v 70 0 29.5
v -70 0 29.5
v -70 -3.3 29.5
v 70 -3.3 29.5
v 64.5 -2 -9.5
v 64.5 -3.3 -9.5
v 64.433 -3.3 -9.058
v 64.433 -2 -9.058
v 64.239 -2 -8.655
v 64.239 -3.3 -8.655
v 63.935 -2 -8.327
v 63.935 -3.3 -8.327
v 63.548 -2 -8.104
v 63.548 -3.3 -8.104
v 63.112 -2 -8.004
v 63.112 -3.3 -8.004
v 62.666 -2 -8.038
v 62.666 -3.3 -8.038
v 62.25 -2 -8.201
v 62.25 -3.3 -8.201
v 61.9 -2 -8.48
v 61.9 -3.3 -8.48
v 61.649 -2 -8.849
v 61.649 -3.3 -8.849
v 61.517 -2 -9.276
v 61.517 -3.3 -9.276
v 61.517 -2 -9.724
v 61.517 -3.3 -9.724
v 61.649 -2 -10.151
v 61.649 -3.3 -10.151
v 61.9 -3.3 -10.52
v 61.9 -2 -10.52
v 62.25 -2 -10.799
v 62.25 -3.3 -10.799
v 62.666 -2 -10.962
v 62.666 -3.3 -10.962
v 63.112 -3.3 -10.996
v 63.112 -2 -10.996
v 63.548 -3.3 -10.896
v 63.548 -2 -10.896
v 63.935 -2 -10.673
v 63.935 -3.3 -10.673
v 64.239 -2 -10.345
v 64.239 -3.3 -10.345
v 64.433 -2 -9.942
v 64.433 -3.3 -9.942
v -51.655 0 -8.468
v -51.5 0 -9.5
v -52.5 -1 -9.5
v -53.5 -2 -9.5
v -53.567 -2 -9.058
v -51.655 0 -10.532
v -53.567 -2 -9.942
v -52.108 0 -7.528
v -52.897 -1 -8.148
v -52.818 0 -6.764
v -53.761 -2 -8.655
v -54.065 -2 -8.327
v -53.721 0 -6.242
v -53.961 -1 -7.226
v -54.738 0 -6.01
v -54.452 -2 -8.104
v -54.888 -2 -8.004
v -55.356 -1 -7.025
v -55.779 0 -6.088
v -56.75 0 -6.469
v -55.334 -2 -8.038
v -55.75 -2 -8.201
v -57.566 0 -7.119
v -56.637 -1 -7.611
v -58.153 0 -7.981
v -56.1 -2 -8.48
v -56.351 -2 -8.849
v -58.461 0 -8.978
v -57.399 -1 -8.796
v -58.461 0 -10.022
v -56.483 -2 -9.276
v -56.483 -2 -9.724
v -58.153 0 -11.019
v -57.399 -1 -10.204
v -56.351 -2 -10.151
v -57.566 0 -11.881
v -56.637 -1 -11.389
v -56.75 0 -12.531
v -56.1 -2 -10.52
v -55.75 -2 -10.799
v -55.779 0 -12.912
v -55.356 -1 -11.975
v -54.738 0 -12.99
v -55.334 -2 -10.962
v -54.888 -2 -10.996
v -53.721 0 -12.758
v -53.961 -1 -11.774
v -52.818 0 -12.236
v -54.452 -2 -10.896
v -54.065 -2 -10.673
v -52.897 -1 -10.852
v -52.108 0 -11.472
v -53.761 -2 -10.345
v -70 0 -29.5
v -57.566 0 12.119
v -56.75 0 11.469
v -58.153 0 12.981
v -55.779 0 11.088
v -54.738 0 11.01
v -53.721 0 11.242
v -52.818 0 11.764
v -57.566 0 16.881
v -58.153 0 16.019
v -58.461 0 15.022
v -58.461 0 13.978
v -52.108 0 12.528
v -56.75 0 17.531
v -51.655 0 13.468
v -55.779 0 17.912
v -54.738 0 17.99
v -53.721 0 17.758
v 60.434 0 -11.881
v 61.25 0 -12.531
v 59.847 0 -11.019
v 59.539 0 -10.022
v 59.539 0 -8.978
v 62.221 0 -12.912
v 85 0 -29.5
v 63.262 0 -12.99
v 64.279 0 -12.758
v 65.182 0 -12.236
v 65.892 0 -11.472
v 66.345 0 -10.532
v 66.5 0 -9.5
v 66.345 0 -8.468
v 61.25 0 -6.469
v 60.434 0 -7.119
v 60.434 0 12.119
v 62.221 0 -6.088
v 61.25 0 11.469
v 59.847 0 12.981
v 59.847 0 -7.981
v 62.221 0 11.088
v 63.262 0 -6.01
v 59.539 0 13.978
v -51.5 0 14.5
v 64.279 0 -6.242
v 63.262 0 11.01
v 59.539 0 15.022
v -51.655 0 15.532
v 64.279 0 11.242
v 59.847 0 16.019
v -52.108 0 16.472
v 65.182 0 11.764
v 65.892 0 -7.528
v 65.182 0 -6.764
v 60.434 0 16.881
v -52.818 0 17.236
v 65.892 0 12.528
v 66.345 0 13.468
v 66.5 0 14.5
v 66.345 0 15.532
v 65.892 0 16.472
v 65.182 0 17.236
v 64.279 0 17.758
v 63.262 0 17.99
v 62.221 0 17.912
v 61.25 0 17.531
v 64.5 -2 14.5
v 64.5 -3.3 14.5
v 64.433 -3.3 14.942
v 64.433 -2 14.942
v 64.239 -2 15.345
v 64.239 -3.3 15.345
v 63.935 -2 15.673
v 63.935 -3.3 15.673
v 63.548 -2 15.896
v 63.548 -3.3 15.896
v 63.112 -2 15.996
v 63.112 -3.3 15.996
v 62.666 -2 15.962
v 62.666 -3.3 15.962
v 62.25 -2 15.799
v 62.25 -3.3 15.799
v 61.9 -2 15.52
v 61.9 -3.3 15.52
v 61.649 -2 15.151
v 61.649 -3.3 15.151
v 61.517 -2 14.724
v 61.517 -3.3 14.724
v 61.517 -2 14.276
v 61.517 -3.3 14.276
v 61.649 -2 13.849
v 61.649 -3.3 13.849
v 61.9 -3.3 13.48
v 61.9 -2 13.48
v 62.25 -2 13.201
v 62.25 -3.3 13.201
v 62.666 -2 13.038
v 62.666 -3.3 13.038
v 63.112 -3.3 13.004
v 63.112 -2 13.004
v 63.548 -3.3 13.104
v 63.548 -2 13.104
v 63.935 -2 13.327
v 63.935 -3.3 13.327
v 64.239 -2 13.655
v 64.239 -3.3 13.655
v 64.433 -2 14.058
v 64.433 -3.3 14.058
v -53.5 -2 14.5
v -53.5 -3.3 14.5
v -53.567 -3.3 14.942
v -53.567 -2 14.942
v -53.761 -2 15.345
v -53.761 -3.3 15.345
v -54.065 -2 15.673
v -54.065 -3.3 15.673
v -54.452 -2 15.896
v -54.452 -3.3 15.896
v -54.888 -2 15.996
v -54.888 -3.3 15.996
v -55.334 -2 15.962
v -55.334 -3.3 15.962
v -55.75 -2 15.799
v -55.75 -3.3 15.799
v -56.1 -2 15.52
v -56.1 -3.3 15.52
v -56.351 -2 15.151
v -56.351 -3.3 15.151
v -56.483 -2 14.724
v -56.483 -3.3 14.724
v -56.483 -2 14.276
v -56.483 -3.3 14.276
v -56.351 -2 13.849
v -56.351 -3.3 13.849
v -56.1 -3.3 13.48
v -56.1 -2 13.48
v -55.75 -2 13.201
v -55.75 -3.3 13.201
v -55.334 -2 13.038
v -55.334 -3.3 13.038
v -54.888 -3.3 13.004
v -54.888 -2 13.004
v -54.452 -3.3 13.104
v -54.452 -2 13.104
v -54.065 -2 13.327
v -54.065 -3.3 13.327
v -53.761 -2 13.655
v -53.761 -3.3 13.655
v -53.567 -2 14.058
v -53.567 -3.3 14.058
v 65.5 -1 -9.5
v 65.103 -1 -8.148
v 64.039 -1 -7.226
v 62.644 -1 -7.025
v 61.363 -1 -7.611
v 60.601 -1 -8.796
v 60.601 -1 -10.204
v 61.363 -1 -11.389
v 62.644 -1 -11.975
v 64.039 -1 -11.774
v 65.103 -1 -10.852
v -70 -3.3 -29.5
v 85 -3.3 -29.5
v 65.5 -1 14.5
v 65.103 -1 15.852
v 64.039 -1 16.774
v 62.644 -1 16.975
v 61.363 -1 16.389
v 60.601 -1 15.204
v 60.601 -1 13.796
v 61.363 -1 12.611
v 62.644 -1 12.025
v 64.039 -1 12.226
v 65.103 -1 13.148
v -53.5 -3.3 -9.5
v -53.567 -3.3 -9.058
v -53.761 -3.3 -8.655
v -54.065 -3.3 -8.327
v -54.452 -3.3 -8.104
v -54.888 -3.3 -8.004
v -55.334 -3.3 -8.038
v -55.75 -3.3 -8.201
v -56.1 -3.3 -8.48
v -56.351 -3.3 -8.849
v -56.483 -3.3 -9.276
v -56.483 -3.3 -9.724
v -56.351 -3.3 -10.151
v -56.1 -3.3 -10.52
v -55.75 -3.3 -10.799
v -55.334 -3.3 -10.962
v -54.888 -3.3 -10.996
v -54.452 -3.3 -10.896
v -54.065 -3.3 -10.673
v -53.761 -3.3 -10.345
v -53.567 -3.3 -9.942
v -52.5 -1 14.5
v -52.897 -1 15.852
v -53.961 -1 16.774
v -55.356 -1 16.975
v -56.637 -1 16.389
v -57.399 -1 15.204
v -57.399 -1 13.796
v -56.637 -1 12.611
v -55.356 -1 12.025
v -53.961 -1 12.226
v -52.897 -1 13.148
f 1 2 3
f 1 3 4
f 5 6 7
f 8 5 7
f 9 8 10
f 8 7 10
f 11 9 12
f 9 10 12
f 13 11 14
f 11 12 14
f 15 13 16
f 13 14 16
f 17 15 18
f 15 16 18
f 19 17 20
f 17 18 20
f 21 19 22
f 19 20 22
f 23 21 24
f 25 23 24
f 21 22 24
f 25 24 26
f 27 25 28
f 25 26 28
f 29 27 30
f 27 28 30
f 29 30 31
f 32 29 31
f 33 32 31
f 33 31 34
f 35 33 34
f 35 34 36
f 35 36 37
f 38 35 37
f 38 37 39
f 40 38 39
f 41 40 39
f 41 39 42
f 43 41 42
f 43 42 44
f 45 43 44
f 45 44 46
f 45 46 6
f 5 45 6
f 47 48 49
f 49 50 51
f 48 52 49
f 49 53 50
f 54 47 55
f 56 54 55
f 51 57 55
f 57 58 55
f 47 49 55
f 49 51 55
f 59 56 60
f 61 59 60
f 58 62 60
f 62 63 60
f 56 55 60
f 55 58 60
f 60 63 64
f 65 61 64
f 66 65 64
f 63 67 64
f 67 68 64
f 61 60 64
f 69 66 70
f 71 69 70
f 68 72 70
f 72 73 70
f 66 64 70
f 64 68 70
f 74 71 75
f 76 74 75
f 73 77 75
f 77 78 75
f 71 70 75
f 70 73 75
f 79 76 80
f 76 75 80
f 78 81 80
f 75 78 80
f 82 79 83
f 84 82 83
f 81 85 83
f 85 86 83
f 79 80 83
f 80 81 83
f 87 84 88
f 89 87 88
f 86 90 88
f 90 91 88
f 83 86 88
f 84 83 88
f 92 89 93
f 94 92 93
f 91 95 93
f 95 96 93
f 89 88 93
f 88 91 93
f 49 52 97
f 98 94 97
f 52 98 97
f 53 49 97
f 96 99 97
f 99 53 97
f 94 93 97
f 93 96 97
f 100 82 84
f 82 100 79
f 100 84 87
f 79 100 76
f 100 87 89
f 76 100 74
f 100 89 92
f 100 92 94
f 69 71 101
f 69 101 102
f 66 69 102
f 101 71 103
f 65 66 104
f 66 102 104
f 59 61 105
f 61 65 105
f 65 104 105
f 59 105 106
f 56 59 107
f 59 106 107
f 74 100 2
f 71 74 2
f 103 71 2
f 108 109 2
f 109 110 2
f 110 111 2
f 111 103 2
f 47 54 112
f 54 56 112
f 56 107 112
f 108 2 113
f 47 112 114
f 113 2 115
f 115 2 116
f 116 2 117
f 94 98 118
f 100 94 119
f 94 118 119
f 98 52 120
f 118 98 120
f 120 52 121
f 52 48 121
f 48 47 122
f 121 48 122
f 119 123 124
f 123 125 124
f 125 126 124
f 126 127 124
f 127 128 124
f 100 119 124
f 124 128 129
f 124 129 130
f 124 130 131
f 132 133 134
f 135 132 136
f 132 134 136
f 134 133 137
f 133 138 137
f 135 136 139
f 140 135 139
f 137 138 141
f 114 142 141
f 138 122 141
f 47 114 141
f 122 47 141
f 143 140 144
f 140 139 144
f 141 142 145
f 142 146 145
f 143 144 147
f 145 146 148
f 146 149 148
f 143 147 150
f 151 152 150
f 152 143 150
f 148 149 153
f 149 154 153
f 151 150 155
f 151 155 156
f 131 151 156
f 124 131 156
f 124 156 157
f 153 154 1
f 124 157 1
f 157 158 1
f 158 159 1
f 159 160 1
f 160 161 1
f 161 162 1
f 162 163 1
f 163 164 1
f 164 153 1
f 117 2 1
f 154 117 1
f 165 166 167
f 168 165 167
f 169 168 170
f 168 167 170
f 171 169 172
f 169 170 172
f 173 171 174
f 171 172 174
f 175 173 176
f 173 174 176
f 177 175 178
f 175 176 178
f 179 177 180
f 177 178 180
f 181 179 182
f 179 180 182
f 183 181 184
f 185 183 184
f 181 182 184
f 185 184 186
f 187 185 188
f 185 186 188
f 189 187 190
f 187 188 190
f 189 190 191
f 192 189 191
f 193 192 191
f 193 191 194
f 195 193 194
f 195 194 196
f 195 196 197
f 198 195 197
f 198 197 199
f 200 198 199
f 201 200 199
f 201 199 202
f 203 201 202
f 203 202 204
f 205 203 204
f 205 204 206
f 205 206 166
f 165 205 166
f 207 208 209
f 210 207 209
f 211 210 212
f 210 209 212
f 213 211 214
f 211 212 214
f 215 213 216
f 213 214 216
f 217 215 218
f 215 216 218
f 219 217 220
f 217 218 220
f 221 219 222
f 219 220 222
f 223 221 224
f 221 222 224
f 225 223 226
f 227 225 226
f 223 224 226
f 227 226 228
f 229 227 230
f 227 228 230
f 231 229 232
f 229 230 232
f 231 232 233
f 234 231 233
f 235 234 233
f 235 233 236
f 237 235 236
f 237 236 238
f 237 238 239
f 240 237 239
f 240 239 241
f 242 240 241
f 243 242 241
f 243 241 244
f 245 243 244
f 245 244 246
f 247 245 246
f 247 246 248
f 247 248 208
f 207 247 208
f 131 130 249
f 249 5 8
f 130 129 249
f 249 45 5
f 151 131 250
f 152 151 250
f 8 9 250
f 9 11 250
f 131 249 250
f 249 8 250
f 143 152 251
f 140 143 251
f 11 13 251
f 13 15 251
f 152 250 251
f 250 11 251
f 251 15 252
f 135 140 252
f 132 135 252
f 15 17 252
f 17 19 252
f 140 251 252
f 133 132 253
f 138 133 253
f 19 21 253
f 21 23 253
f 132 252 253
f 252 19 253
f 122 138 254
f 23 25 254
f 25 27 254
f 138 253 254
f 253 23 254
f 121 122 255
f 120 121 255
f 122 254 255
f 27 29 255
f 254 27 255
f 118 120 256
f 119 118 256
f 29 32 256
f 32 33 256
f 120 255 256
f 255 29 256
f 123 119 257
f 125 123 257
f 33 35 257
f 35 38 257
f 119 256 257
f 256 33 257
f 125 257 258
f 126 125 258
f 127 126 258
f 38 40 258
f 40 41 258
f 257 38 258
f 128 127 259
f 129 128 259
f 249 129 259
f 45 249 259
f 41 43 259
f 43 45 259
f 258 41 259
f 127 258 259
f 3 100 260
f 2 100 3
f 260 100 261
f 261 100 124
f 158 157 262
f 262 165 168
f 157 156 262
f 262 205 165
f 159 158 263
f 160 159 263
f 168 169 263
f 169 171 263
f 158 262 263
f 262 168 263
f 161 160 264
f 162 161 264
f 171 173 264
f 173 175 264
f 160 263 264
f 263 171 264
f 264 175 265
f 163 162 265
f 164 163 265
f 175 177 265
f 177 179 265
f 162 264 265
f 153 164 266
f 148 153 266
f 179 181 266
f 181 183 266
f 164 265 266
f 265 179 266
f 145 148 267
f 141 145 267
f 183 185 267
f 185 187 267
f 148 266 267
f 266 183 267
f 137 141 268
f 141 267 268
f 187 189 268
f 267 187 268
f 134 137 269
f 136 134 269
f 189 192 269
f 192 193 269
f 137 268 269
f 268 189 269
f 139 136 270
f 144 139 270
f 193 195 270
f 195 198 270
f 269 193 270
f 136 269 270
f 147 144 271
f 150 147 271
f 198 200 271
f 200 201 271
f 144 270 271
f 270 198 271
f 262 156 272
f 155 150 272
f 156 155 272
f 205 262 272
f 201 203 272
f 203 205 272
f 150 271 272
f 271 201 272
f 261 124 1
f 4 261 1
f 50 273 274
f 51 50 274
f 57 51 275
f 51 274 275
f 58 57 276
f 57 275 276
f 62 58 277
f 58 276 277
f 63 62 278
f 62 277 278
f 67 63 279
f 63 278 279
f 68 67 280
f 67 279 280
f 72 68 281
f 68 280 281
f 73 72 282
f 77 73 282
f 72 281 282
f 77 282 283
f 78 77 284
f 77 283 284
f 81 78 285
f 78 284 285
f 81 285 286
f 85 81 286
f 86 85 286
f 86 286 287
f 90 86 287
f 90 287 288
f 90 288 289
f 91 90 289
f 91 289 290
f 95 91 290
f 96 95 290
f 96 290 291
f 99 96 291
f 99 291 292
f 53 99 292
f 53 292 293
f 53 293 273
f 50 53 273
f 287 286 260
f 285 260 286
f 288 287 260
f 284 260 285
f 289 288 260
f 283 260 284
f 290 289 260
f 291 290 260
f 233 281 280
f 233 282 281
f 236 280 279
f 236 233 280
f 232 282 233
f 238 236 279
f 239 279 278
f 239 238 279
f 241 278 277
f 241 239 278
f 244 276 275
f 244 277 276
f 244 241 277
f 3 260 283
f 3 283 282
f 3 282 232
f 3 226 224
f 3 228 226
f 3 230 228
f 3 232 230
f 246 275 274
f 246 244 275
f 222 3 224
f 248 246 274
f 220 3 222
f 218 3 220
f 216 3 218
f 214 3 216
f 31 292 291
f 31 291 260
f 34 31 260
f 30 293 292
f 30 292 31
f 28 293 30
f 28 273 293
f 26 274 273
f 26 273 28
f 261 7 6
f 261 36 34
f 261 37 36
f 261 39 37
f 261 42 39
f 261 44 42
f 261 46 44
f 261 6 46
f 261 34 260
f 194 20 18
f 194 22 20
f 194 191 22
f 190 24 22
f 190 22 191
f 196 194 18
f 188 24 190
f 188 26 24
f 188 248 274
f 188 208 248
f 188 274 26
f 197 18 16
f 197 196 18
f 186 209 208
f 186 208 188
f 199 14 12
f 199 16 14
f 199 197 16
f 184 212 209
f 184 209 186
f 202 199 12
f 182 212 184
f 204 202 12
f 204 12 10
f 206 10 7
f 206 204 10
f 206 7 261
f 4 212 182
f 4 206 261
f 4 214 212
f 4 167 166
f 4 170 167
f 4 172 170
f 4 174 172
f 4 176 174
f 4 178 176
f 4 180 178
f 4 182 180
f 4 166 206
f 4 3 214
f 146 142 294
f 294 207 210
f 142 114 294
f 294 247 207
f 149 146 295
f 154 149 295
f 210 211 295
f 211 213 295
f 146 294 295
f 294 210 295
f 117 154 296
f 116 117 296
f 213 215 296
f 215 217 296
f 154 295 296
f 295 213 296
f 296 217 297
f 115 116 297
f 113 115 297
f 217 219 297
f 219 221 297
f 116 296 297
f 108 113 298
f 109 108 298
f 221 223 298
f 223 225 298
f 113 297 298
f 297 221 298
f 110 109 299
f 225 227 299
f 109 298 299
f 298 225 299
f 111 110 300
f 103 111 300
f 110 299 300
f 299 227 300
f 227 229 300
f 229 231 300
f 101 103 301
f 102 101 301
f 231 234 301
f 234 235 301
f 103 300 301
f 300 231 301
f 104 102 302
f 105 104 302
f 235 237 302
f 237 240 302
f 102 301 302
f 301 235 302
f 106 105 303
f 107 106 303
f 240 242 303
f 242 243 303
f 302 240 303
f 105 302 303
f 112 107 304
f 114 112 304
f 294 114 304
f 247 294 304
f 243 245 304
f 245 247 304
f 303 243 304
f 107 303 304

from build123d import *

# Parameters (mm, degrees)
F0_W     = 140
F0_H     = 59
F1_DEPTH = 3.3
F2_R     = 1.5
F3_DEPTH = 25
F4_SIZE  = 2


with BuildPart() as f1:
    # F0 (on Front) → F1 (new body)
    with BuildSketch(Plane.XZ):
        Rectangle(F0_W, F0_H)
        Polygon((85, -29.5), (70, 29.5), (70, -29.5), align=None)
    extrude(amount=F1_DEPTH)

    # F2 (on face) → F3 (cut)
    with BuildSketch(Plane.XZ.offset(3.3)):
        with Locations((-55, 14.5)):
            Circle(F2_R)
        with Locations((63, 14.5)):
            Circle(F2_R)
        with Locations((63, -9.5)):
            Circle(F2_R)
        with Locations((-55, -9.5)):
            Circle(F2_R)
    extrude(amount=-F3_DEPTH, mode=Mode.SUBTRACT)

    # F4
    f4_edges = [f1.edges().sort_by_distance(p)[0] for p in [
        (-56.5, 0, -9.5),
        (-56.5, 0, 14.5),
        (61.5, 0, -9.5),
        (61.5, 0, 14.5),
    ]]
    chamfer(f4_edges, length=F4_SIZE)


solid = f1.part
